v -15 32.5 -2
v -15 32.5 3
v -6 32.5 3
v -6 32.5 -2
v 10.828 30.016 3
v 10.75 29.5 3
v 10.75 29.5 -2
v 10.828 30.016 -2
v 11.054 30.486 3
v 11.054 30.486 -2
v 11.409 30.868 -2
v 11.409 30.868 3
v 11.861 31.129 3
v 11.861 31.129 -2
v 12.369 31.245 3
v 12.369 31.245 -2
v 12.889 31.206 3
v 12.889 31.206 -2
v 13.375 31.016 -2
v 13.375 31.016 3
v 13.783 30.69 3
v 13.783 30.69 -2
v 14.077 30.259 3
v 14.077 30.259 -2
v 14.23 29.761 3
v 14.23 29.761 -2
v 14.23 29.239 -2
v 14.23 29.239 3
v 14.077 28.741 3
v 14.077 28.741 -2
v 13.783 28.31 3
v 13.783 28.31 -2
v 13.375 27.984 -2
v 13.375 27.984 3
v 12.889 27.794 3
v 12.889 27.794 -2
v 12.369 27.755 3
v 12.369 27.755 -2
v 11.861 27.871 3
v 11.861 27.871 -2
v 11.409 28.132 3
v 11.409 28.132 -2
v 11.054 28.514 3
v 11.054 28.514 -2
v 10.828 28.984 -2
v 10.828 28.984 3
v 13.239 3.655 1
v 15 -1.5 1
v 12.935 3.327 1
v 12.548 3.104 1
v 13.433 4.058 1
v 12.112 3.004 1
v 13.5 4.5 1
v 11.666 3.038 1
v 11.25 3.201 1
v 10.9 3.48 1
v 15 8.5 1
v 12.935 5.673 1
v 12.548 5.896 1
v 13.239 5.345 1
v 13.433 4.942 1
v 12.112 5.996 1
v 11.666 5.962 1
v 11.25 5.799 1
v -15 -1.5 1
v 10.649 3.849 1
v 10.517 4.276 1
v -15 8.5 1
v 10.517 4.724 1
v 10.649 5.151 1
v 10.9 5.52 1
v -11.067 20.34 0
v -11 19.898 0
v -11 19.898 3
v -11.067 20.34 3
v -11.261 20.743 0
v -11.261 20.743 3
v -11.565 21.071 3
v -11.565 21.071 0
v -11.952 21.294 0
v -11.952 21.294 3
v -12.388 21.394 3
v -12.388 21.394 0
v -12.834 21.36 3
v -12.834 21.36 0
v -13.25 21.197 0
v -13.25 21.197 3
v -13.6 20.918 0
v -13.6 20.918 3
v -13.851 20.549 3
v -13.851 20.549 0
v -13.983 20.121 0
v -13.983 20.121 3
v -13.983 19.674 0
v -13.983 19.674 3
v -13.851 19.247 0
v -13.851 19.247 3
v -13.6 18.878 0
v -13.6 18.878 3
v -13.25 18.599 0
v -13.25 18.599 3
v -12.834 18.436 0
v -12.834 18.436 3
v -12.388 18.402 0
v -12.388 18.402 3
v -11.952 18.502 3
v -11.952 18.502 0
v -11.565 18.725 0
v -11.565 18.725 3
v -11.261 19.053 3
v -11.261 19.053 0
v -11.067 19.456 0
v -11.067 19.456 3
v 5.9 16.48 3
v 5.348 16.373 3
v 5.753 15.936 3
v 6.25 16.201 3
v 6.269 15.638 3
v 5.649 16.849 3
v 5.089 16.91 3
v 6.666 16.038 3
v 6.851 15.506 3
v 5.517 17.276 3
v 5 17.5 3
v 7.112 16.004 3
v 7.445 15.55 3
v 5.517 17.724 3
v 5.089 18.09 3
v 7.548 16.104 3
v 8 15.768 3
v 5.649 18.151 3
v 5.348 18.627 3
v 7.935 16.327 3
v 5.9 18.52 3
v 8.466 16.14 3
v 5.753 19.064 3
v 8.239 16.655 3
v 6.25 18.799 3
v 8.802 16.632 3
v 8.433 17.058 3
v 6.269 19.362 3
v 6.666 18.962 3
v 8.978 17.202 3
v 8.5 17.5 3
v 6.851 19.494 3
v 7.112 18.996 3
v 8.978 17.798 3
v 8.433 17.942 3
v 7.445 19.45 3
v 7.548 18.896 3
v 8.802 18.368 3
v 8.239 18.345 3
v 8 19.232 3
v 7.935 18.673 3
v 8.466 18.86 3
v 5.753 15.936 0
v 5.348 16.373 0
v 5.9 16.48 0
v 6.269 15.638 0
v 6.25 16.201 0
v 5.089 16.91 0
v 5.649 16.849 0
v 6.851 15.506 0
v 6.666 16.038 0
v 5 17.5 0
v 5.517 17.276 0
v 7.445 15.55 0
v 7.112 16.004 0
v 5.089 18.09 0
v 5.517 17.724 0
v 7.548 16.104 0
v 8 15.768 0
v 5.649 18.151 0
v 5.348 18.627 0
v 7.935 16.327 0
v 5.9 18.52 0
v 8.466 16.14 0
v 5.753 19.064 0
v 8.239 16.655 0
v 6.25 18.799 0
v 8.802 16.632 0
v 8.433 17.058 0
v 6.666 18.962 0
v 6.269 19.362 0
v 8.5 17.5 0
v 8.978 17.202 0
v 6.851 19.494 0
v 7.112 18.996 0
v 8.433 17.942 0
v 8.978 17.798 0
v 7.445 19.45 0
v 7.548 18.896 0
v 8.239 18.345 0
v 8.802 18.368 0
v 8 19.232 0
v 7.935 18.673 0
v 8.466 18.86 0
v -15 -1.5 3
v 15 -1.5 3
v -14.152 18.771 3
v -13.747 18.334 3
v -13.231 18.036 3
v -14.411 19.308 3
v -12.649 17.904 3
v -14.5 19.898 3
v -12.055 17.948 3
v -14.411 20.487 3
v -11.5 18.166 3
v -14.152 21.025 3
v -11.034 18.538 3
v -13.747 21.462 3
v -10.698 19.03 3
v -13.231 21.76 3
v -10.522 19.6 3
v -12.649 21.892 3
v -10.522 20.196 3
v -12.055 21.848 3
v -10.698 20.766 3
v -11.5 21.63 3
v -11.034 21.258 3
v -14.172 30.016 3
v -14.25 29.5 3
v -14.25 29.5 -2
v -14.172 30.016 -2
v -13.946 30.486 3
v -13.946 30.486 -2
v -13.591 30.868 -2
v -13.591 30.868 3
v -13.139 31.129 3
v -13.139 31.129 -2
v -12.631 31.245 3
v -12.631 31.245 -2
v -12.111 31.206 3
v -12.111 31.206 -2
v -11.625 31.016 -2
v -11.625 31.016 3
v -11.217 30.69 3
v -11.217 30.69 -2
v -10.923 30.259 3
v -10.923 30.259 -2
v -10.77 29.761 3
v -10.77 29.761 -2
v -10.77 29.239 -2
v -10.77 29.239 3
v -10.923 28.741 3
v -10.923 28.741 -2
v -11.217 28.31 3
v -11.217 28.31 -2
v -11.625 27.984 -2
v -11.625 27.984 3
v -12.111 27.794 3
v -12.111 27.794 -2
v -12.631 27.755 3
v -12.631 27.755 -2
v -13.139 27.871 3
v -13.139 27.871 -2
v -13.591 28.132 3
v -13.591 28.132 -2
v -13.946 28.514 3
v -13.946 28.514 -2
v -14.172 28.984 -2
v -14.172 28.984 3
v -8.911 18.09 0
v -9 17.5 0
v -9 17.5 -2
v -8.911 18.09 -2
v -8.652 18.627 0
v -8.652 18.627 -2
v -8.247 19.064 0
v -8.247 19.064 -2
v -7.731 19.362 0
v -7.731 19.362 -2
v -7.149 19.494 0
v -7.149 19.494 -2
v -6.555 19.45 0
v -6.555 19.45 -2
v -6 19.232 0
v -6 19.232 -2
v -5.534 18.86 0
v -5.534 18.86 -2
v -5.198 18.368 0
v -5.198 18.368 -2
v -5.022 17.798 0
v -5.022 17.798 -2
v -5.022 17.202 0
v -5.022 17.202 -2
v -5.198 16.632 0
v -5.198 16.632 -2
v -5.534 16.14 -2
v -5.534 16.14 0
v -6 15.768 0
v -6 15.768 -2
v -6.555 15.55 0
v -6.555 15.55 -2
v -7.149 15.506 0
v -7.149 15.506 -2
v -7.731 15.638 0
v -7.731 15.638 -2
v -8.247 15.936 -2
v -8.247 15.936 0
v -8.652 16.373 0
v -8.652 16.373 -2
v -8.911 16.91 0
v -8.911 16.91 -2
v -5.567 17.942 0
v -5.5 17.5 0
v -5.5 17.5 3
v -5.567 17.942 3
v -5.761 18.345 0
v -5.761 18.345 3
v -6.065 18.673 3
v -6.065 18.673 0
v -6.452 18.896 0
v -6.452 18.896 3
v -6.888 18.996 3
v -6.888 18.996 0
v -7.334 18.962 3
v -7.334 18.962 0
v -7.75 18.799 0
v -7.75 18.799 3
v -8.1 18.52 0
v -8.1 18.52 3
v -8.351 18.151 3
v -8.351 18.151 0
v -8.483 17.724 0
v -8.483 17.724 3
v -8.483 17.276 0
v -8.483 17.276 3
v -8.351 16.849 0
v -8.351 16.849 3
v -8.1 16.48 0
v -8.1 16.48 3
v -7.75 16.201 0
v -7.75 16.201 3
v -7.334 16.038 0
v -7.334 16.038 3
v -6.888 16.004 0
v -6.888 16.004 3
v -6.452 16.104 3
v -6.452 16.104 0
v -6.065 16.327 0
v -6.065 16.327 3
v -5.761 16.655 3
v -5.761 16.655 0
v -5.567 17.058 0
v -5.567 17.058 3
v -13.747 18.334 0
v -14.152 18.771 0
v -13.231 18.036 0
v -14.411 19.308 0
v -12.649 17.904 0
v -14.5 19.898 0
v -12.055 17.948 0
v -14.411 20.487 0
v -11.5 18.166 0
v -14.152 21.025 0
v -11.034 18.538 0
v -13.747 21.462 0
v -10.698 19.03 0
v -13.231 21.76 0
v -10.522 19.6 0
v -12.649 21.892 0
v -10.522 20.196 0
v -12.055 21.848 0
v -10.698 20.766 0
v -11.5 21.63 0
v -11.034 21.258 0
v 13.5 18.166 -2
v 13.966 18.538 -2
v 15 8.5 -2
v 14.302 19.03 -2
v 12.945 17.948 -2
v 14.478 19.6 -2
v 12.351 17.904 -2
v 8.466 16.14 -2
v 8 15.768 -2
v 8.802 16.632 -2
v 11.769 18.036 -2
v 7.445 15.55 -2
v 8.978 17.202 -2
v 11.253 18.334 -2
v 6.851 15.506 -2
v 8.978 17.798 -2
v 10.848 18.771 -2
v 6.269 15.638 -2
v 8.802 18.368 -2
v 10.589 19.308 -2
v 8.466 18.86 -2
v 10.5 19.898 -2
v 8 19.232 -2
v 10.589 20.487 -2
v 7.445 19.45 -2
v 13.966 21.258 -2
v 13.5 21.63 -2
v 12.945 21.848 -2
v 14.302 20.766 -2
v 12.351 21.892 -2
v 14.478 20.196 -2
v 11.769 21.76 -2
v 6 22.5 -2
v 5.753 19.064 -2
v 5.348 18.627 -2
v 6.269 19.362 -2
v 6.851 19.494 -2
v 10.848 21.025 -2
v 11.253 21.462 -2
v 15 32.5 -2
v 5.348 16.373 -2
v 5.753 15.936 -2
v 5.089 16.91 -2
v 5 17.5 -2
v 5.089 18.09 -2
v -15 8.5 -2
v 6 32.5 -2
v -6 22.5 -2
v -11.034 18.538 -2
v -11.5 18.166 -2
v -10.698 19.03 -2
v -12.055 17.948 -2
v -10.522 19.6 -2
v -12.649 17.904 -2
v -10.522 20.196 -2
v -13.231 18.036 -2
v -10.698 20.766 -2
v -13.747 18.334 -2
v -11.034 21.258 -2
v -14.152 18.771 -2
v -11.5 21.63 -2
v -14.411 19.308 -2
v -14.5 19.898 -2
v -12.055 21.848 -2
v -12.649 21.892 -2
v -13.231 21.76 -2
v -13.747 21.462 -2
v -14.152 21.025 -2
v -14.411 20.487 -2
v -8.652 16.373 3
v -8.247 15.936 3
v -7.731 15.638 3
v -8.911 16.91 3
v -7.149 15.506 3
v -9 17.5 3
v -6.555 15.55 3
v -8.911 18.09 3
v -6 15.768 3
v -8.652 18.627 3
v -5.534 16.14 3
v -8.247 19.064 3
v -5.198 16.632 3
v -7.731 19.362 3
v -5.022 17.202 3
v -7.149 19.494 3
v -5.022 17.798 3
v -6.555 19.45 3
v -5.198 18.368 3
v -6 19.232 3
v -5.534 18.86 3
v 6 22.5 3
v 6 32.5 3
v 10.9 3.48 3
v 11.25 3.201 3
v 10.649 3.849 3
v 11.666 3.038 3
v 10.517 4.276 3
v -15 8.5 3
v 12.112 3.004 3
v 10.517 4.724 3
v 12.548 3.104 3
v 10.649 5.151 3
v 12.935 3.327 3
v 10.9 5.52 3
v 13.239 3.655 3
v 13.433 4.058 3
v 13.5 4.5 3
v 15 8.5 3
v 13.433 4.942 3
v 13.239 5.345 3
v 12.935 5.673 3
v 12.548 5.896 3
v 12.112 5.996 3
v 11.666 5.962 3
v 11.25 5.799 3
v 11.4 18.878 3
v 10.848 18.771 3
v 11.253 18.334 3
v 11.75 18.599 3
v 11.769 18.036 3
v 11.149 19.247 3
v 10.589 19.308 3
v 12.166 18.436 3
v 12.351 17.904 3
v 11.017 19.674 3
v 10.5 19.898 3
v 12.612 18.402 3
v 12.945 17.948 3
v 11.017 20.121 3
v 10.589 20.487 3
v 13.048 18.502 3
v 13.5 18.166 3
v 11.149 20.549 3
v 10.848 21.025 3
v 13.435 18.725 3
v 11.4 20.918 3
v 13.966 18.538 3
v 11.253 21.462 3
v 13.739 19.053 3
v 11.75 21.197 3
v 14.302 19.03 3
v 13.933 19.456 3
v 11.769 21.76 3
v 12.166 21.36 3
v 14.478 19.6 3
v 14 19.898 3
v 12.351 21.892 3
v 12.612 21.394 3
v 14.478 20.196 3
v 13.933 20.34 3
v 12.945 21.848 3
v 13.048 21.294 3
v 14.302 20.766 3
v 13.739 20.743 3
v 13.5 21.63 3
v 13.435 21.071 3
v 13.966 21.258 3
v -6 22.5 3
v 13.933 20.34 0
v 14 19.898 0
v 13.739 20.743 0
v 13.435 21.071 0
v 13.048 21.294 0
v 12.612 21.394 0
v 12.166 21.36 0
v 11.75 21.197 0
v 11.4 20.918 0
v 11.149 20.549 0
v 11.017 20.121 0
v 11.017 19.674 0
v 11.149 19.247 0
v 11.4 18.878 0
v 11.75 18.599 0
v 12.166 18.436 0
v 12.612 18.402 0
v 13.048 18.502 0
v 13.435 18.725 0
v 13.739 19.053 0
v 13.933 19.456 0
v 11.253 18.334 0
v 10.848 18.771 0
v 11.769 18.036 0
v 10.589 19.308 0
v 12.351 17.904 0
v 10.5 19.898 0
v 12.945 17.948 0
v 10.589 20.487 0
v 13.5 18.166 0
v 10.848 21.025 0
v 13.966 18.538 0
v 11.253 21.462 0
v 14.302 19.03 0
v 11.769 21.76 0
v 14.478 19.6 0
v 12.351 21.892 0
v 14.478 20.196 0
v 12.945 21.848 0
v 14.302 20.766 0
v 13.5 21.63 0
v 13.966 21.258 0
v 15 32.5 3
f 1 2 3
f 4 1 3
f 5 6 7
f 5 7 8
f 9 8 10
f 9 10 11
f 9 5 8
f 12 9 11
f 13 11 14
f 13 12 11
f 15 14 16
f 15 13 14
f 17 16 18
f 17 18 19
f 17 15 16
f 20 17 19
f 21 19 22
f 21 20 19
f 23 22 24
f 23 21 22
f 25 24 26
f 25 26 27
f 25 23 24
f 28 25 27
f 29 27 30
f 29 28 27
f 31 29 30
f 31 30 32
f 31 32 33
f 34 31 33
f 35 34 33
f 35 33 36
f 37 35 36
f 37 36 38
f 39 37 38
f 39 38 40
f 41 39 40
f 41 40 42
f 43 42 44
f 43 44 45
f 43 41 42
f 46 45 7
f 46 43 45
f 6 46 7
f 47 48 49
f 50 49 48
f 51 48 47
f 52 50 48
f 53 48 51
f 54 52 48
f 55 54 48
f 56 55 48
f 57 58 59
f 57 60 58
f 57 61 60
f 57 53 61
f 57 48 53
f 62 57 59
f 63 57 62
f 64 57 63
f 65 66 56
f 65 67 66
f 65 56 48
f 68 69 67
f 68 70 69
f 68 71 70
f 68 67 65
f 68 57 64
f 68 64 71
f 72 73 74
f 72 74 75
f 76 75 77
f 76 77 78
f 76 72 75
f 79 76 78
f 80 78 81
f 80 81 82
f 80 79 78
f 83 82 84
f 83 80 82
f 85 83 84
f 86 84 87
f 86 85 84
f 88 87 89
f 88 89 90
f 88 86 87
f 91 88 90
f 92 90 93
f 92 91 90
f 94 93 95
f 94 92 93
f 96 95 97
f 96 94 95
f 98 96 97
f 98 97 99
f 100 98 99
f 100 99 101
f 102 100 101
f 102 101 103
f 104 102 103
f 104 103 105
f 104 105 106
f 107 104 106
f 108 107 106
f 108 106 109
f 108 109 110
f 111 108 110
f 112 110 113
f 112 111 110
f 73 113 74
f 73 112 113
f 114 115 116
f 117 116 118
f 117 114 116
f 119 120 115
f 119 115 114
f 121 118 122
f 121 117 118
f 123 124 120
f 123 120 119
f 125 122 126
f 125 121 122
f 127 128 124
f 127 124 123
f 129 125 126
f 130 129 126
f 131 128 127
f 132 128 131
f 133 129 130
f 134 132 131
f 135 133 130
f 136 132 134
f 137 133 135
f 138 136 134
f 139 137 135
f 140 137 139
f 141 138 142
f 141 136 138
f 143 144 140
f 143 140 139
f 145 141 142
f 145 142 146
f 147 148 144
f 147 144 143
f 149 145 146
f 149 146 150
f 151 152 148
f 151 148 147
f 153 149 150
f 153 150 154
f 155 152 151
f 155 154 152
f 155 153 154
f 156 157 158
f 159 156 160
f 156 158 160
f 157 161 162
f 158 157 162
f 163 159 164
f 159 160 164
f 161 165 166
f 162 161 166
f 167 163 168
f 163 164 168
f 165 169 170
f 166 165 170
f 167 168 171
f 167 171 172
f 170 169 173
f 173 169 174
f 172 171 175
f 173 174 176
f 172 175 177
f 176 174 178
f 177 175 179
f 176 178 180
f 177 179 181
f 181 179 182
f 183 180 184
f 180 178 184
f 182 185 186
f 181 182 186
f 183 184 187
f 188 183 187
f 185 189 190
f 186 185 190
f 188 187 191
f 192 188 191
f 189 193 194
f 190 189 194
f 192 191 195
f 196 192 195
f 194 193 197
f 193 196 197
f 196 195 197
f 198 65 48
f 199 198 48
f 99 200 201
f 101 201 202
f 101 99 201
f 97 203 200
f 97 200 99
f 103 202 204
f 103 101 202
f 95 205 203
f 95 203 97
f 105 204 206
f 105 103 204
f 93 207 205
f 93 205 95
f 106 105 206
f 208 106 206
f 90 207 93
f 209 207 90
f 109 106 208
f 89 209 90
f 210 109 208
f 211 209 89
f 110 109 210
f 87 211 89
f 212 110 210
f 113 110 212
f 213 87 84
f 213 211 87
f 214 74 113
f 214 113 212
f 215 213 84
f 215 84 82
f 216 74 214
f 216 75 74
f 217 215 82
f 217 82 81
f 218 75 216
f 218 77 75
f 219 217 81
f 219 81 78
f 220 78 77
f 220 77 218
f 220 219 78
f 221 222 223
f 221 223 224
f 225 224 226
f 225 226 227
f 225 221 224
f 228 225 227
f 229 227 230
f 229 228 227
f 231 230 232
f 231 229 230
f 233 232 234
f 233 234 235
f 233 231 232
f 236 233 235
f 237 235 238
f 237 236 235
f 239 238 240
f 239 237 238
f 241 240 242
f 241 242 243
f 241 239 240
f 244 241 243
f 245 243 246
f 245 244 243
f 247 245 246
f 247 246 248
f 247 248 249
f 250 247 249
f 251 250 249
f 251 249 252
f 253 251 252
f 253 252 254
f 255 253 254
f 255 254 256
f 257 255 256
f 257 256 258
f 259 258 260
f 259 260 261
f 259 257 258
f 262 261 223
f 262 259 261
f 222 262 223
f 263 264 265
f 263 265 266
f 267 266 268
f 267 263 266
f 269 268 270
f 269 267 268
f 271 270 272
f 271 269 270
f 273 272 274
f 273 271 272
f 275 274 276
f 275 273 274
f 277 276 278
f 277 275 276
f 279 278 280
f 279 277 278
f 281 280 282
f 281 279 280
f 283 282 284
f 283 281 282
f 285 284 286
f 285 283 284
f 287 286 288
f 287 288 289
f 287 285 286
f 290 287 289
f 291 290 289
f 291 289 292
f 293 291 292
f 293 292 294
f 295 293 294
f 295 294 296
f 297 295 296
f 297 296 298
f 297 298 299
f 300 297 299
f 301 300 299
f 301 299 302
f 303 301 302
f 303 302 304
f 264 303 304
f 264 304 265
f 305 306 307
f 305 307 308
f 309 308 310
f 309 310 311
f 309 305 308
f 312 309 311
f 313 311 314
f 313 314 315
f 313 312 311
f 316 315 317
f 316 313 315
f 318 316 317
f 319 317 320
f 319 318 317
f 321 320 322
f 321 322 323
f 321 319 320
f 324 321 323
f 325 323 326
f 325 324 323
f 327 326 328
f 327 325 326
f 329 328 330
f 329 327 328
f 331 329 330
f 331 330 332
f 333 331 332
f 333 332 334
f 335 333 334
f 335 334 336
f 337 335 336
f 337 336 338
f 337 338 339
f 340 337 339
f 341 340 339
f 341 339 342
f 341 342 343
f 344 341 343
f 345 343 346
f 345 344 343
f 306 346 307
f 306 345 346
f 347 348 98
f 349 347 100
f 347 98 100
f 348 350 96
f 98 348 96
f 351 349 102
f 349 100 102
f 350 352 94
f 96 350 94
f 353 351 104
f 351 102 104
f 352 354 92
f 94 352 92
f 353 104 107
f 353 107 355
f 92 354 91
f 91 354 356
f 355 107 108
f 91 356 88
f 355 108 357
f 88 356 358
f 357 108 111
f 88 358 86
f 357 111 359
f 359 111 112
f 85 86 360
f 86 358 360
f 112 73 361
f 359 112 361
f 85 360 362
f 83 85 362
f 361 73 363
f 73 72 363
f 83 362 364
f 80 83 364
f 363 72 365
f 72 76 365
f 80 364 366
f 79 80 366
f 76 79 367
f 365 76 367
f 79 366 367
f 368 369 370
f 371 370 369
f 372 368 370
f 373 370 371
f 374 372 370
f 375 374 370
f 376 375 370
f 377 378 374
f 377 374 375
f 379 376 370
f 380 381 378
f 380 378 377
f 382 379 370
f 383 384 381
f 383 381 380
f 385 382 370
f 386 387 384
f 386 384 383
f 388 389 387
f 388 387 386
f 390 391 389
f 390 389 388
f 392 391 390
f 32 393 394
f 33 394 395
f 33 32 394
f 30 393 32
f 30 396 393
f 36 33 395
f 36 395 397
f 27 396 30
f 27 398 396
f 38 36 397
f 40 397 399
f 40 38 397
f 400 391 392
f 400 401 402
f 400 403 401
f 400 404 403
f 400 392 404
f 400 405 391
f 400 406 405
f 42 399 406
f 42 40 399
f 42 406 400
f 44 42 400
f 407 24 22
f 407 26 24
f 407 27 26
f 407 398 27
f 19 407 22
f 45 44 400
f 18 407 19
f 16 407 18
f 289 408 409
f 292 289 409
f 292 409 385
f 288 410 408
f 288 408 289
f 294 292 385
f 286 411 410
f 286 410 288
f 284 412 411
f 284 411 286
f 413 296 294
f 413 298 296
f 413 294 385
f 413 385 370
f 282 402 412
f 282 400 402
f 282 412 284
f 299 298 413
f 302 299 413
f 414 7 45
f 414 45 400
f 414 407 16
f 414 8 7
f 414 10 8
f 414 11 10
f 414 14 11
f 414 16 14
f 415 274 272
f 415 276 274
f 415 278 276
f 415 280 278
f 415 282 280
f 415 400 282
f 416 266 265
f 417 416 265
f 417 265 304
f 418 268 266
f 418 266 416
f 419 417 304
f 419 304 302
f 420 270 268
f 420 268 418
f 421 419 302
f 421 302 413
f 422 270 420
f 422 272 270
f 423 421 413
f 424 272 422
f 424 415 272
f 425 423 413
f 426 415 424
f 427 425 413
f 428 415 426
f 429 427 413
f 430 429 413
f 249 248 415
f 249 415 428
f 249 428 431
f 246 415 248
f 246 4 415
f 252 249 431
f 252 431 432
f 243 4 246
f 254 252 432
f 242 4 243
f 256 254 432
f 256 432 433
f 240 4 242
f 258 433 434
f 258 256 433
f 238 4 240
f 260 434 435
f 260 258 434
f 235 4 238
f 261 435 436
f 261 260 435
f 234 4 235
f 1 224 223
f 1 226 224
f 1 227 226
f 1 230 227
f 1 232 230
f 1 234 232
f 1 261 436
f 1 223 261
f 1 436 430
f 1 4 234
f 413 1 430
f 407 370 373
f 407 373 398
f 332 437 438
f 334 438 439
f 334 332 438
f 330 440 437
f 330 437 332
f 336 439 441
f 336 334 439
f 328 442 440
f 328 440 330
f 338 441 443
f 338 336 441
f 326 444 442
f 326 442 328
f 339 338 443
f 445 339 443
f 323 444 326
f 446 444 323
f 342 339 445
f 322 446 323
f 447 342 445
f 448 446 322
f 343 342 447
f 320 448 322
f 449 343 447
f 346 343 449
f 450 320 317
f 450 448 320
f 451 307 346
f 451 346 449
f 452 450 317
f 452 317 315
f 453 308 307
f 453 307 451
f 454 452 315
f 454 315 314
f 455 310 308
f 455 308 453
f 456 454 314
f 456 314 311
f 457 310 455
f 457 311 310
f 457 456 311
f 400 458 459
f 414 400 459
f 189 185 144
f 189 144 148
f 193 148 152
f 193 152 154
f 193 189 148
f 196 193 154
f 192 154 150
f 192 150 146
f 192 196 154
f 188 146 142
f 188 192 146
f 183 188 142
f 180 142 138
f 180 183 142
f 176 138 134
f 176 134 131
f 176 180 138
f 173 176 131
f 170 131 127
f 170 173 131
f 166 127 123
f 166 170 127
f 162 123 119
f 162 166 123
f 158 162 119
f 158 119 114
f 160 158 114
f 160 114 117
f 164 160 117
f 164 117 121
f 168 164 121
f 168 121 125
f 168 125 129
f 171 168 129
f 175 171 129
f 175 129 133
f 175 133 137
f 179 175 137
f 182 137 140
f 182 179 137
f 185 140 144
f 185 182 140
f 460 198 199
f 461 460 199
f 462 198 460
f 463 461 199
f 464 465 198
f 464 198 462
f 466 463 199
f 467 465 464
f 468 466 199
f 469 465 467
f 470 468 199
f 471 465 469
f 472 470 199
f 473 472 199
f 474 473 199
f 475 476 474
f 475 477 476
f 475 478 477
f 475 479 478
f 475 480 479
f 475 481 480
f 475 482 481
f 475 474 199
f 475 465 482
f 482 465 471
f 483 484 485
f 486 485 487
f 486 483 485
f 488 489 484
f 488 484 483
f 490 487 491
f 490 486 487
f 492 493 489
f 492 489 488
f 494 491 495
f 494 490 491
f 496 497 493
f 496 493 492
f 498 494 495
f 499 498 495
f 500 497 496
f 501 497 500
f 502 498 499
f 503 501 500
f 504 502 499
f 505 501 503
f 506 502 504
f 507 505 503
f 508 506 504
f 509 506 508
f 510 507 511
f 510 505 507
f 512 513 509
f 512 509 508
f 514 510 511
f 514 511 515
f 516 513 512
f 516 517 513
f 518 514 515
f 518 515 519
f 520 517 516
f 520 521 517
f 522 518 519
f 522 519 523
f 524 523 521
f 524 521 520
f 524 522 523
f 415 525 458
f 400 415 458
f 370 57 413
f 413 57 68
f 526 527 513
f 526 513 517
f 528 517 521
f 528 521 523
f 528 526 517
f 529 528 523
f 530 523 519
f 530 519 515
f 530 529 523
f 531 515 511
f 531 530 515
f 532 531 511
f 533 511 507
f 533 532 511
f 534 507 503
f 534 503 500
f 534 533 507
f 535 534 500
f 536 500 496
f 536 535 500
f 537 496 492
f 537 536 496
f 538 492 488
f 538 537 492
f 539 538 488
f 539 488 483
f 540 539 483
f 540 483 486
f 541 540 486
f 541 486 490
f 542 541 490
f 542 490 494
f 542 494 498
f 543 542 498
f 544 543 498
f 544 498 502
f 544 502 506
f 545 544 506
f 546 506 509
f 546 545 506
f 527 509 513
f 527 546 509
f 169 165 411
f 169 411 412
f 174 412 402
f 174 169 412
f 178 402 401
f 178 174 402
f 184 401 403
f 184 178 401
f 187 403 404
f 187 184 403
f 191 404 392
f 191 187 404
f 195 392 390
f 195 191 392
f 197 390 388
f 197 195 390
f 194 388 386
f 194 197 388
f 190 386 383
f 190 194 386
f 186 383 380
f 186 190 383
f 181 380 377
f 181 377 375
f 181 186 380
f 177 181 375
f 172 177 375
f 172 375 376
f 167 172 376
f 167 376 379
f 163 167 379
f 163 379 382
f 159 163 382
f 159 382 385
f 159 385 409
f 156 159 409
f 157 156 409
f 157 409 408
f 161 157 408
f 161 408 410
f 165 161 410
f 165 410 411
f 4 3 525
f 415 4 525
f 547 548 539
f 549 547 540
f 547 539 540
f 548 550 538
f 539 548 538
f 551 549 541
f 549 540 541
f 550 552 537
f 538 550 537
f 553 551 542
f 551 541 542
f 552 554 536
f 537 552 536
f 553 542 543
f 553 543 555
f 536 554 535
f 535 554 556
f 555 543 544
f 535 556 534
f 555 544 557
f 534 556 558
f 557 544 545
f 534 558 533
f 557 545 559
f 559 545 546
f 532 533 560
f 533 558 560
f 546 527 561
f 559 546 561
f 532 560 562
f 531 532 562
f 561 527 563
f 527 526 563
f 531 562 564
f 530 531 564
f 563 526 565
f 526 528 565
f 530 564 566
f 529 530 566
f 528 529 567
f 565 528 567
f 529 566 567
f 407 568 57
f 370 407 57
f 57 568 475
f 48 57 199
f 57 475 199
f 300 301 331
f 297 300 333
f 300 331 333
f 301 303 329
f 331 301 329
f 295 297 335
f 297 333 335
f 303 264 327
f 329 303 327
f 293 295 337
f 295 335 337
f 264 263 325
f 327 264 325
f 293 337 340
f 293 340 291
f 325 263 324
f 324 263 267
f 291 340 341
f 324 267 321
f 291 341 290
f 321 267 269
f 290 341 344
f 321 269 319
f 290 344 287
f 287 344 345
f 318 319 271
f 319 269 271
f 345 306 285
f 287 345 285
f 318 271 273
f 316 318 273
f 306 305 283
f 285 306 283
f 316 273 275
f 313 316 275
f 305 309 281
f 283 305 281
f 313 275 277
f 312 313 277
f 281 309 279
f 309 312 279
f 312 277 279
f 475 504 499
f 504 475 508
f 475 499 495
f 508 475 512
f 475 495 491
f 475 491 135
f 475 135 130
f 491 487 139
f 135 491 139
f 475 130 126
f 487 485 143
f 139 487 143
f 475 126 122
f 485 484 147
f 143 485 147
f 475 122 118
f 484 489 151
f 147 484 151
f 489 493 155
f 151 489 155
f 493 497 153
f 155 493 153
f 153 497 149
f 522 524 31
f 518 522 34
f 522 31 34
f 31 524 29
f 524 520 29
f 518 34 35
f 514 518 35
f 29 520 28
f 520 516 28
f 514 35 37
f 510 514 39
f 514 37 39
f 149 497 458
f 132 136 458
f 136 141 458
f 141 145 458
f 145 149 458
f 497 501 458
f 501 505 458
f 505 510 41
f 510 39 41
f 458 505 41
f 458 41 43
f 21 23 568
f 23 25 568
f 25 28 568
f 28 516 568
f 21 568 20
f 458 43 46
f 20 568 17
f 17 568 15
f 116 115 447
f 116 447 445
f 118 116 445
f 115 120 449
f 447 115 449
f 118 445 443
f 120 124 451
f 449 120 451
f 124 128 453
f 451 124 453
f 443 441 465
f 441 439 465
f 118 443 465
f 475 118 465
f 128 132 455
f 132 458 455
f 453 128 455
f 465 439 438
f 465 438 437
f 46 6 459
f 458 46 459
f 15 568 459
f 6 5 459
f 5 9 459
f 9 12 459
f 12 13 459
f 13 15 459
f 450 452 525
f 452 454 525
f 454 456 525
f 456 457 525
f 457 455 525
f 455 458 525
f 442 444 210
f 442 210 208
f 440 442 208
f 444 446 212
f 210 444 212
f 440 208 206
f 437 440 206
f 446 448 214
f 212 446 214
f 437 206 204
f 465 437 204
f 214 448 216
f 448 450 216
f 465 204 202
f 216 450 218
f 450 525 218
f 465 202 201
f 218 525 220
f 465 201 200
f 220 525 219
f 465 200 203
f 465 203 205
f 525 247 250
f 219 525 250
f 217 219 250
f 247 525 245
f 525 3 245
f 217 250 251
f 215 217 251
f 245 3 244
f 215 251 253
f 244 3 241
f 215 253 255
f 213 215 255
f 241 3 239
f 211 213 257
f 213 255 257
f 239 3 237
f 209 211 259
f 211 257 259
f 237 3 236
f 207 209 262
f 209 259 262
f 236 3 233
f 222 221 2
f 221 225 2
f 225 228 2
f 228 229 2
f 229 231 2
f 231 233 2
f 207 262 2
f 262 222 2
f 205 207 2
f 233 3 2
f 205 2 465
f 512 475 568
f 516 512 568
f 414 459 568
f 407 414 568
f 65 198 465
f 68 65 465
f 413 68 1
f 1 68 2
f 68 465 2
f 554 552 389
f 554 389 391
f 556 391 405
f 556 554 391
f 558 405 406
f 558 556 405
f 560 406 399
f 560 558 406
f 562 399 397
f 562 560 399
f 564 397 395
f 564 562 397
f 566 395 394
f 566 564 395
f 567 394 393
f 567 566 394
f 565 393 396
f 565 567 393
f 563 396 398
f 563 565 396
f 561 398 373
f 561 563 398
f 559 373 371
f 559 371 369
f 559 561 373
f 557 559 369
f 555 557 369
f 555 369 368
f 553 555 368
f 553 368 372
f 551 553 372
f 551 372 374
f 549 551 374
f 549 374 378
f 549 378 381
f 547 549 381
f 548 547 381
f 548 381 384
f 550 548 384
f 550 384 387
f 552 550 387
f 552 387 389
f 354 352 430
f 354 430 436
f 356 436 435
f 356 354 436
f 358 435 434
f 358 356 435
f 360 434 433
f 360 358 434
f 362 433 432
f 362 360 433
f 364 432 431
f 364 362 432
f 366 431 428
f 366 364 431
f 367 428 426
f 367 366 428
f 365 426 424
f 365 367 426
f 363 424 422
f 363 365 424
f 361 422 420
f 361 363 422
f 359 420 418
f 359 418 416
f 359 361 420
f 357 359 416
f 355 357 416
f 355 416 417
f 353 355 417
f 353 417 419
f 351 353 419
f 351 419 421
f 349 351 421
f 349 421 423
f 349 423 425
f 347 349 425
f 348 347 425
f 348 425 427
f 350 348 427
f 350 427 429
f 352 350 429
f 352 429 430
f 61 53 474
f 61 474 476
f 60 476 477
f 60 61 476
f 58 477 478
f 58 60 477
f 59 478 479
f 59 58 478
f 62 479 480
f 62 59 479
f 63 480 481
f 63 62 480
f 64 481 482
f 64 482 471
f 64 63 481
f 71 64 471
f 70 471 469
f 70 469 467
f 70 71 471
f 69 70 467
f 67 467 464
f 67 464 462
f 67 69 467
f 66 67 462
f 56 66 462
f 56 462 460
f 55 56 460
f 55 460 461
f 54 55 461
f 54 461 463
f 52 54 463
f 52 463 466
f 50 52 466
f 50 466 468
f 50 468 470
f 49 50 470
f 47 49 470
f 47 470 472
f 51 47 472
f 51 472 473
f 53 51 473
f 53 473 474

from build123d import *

# Parameters (mm, degrees)
RESSALTO_EXTRUS_O2_OUTLINE_W = 30
RESSALTO_EXTRUS_O2_OUTLINE_H = 24
RESSALTO_EXTRUS_O2_OUTLINE_R = 1.5
RESSALTO_EXTRUS_O2_DEPTH     = 3
ESBO_O5_W                    = 30
ESBO_O5_H                    = 10
CORTE_EXTRUS_O2_DEPTH        = 1
RESSALTO_EXTRUS_O3_START     = -3.000012
ESBO_O6_R                    = 2
ESBO_O6_R_2                  = 1.75
RESSALTO_EXTRUS_O3_DEPTH     = 5.000012


# Read off the part's stored shape, not the designer's step: Ressalto-extrusão2
with BuildPart() as part:
    # Ressalto-extrusão2 outline → Ressalto-extrusão2 (new body)
    with BuildSketch(Plane.XY):
        with Locations((0, 10.5)):
            Rectangle(RESSALTO_EXTRUS_O2_OUTLINE_W, RESSALTO_EXTRUS_O2_OUTLINE_H)
        with Locations((12, 4.5)):
            Circle(RESSALTO_EXTRUS_O2_OUTLINE_R, mode=Mode.SUBTRACT)
        with Locations((-12.5, 19.897915762)):
            Circle(RESSALTO_EXTRUS_O2_OUTLINE_R, mode=Mode.SUBTRACT)
        with Locations((-7, 17.5)):
            Circle(RESSALTO_EXTRUS_O2_OUTLINE_R, mode=Mode.SUBTRACT)
        with Locations((7, 17.5)):
            Circle(RESSALTO_EXTRUS_O2_OUTLINE_R, mode=Mode.SUBTRACT)
        with Locations((12.5, 19.897915762)):
            Circle(RESSALTO_EXTRUS_O2_OUTLINE_R, mode=Mode.SUBTRACT)
    extrude(amount=RESSALTO_EXTRUS_O2_DEPTH)

    # Esboço5 → Corte-extrusão2 (cut)
    with BuildSketch(Plane(origin=(0, 0, 0), x_dir=(-1, 0, 0), z_dir=(0, 0, -1))):
        with Locations((0, 3.5)):
            Rectangle(ESBO_O5_W, ESBO_O5_H)
    extrude(amount=-CORTE_EXTRUS_O2_DEPTH, mode=Mode.SUBTRACT)

    # Esboço6 → Ressalto-extrusão3 (add)
    with BuildSketch(Plane(origin=(0, 0, 0), x_dir=(-1, 0, 0), z_dir=(0, 0, -1)).offset(RESSALTO_EXTRUS_O3_START)):
        Polygon((-15, 8.5), (15, 8.5), (15, 32.5), (6, 32.5), (6, 22.5), (-6, 22.5), (-6, 32.5), (-15, 32.5), align=None)
        with Locations((12.5, 19.897915762)):
            Circle(ESBO_O6_R, mode=Mode.SUBTRACT)
        with Locations((7, 17.5)):
            Circle(ESBO_O6_R, mode=Mode.SUBTRACT)
        with Locations((-7, 17.5)):
            Circle(ESBO_O6_R, mode=Mode.SUBTRACT)
        with Locations((-12.5, 19.897915762)):
            Circle(ESBO_O6_R, mode=Mode.SUBTRACT)
        with Locations((-12.5, 29.5)):
            Circle(ESBO_O6_R_2, mode=Mode.SUBTRACT)
        with Locations((12.5, 29.5)):
            Circle(ESBO_O6_R_2, mode=Mode.SUBTRACT)
    extrude(amount=RESSALTO_EXTRUS_O3_DEPTH)


solid = part.part
